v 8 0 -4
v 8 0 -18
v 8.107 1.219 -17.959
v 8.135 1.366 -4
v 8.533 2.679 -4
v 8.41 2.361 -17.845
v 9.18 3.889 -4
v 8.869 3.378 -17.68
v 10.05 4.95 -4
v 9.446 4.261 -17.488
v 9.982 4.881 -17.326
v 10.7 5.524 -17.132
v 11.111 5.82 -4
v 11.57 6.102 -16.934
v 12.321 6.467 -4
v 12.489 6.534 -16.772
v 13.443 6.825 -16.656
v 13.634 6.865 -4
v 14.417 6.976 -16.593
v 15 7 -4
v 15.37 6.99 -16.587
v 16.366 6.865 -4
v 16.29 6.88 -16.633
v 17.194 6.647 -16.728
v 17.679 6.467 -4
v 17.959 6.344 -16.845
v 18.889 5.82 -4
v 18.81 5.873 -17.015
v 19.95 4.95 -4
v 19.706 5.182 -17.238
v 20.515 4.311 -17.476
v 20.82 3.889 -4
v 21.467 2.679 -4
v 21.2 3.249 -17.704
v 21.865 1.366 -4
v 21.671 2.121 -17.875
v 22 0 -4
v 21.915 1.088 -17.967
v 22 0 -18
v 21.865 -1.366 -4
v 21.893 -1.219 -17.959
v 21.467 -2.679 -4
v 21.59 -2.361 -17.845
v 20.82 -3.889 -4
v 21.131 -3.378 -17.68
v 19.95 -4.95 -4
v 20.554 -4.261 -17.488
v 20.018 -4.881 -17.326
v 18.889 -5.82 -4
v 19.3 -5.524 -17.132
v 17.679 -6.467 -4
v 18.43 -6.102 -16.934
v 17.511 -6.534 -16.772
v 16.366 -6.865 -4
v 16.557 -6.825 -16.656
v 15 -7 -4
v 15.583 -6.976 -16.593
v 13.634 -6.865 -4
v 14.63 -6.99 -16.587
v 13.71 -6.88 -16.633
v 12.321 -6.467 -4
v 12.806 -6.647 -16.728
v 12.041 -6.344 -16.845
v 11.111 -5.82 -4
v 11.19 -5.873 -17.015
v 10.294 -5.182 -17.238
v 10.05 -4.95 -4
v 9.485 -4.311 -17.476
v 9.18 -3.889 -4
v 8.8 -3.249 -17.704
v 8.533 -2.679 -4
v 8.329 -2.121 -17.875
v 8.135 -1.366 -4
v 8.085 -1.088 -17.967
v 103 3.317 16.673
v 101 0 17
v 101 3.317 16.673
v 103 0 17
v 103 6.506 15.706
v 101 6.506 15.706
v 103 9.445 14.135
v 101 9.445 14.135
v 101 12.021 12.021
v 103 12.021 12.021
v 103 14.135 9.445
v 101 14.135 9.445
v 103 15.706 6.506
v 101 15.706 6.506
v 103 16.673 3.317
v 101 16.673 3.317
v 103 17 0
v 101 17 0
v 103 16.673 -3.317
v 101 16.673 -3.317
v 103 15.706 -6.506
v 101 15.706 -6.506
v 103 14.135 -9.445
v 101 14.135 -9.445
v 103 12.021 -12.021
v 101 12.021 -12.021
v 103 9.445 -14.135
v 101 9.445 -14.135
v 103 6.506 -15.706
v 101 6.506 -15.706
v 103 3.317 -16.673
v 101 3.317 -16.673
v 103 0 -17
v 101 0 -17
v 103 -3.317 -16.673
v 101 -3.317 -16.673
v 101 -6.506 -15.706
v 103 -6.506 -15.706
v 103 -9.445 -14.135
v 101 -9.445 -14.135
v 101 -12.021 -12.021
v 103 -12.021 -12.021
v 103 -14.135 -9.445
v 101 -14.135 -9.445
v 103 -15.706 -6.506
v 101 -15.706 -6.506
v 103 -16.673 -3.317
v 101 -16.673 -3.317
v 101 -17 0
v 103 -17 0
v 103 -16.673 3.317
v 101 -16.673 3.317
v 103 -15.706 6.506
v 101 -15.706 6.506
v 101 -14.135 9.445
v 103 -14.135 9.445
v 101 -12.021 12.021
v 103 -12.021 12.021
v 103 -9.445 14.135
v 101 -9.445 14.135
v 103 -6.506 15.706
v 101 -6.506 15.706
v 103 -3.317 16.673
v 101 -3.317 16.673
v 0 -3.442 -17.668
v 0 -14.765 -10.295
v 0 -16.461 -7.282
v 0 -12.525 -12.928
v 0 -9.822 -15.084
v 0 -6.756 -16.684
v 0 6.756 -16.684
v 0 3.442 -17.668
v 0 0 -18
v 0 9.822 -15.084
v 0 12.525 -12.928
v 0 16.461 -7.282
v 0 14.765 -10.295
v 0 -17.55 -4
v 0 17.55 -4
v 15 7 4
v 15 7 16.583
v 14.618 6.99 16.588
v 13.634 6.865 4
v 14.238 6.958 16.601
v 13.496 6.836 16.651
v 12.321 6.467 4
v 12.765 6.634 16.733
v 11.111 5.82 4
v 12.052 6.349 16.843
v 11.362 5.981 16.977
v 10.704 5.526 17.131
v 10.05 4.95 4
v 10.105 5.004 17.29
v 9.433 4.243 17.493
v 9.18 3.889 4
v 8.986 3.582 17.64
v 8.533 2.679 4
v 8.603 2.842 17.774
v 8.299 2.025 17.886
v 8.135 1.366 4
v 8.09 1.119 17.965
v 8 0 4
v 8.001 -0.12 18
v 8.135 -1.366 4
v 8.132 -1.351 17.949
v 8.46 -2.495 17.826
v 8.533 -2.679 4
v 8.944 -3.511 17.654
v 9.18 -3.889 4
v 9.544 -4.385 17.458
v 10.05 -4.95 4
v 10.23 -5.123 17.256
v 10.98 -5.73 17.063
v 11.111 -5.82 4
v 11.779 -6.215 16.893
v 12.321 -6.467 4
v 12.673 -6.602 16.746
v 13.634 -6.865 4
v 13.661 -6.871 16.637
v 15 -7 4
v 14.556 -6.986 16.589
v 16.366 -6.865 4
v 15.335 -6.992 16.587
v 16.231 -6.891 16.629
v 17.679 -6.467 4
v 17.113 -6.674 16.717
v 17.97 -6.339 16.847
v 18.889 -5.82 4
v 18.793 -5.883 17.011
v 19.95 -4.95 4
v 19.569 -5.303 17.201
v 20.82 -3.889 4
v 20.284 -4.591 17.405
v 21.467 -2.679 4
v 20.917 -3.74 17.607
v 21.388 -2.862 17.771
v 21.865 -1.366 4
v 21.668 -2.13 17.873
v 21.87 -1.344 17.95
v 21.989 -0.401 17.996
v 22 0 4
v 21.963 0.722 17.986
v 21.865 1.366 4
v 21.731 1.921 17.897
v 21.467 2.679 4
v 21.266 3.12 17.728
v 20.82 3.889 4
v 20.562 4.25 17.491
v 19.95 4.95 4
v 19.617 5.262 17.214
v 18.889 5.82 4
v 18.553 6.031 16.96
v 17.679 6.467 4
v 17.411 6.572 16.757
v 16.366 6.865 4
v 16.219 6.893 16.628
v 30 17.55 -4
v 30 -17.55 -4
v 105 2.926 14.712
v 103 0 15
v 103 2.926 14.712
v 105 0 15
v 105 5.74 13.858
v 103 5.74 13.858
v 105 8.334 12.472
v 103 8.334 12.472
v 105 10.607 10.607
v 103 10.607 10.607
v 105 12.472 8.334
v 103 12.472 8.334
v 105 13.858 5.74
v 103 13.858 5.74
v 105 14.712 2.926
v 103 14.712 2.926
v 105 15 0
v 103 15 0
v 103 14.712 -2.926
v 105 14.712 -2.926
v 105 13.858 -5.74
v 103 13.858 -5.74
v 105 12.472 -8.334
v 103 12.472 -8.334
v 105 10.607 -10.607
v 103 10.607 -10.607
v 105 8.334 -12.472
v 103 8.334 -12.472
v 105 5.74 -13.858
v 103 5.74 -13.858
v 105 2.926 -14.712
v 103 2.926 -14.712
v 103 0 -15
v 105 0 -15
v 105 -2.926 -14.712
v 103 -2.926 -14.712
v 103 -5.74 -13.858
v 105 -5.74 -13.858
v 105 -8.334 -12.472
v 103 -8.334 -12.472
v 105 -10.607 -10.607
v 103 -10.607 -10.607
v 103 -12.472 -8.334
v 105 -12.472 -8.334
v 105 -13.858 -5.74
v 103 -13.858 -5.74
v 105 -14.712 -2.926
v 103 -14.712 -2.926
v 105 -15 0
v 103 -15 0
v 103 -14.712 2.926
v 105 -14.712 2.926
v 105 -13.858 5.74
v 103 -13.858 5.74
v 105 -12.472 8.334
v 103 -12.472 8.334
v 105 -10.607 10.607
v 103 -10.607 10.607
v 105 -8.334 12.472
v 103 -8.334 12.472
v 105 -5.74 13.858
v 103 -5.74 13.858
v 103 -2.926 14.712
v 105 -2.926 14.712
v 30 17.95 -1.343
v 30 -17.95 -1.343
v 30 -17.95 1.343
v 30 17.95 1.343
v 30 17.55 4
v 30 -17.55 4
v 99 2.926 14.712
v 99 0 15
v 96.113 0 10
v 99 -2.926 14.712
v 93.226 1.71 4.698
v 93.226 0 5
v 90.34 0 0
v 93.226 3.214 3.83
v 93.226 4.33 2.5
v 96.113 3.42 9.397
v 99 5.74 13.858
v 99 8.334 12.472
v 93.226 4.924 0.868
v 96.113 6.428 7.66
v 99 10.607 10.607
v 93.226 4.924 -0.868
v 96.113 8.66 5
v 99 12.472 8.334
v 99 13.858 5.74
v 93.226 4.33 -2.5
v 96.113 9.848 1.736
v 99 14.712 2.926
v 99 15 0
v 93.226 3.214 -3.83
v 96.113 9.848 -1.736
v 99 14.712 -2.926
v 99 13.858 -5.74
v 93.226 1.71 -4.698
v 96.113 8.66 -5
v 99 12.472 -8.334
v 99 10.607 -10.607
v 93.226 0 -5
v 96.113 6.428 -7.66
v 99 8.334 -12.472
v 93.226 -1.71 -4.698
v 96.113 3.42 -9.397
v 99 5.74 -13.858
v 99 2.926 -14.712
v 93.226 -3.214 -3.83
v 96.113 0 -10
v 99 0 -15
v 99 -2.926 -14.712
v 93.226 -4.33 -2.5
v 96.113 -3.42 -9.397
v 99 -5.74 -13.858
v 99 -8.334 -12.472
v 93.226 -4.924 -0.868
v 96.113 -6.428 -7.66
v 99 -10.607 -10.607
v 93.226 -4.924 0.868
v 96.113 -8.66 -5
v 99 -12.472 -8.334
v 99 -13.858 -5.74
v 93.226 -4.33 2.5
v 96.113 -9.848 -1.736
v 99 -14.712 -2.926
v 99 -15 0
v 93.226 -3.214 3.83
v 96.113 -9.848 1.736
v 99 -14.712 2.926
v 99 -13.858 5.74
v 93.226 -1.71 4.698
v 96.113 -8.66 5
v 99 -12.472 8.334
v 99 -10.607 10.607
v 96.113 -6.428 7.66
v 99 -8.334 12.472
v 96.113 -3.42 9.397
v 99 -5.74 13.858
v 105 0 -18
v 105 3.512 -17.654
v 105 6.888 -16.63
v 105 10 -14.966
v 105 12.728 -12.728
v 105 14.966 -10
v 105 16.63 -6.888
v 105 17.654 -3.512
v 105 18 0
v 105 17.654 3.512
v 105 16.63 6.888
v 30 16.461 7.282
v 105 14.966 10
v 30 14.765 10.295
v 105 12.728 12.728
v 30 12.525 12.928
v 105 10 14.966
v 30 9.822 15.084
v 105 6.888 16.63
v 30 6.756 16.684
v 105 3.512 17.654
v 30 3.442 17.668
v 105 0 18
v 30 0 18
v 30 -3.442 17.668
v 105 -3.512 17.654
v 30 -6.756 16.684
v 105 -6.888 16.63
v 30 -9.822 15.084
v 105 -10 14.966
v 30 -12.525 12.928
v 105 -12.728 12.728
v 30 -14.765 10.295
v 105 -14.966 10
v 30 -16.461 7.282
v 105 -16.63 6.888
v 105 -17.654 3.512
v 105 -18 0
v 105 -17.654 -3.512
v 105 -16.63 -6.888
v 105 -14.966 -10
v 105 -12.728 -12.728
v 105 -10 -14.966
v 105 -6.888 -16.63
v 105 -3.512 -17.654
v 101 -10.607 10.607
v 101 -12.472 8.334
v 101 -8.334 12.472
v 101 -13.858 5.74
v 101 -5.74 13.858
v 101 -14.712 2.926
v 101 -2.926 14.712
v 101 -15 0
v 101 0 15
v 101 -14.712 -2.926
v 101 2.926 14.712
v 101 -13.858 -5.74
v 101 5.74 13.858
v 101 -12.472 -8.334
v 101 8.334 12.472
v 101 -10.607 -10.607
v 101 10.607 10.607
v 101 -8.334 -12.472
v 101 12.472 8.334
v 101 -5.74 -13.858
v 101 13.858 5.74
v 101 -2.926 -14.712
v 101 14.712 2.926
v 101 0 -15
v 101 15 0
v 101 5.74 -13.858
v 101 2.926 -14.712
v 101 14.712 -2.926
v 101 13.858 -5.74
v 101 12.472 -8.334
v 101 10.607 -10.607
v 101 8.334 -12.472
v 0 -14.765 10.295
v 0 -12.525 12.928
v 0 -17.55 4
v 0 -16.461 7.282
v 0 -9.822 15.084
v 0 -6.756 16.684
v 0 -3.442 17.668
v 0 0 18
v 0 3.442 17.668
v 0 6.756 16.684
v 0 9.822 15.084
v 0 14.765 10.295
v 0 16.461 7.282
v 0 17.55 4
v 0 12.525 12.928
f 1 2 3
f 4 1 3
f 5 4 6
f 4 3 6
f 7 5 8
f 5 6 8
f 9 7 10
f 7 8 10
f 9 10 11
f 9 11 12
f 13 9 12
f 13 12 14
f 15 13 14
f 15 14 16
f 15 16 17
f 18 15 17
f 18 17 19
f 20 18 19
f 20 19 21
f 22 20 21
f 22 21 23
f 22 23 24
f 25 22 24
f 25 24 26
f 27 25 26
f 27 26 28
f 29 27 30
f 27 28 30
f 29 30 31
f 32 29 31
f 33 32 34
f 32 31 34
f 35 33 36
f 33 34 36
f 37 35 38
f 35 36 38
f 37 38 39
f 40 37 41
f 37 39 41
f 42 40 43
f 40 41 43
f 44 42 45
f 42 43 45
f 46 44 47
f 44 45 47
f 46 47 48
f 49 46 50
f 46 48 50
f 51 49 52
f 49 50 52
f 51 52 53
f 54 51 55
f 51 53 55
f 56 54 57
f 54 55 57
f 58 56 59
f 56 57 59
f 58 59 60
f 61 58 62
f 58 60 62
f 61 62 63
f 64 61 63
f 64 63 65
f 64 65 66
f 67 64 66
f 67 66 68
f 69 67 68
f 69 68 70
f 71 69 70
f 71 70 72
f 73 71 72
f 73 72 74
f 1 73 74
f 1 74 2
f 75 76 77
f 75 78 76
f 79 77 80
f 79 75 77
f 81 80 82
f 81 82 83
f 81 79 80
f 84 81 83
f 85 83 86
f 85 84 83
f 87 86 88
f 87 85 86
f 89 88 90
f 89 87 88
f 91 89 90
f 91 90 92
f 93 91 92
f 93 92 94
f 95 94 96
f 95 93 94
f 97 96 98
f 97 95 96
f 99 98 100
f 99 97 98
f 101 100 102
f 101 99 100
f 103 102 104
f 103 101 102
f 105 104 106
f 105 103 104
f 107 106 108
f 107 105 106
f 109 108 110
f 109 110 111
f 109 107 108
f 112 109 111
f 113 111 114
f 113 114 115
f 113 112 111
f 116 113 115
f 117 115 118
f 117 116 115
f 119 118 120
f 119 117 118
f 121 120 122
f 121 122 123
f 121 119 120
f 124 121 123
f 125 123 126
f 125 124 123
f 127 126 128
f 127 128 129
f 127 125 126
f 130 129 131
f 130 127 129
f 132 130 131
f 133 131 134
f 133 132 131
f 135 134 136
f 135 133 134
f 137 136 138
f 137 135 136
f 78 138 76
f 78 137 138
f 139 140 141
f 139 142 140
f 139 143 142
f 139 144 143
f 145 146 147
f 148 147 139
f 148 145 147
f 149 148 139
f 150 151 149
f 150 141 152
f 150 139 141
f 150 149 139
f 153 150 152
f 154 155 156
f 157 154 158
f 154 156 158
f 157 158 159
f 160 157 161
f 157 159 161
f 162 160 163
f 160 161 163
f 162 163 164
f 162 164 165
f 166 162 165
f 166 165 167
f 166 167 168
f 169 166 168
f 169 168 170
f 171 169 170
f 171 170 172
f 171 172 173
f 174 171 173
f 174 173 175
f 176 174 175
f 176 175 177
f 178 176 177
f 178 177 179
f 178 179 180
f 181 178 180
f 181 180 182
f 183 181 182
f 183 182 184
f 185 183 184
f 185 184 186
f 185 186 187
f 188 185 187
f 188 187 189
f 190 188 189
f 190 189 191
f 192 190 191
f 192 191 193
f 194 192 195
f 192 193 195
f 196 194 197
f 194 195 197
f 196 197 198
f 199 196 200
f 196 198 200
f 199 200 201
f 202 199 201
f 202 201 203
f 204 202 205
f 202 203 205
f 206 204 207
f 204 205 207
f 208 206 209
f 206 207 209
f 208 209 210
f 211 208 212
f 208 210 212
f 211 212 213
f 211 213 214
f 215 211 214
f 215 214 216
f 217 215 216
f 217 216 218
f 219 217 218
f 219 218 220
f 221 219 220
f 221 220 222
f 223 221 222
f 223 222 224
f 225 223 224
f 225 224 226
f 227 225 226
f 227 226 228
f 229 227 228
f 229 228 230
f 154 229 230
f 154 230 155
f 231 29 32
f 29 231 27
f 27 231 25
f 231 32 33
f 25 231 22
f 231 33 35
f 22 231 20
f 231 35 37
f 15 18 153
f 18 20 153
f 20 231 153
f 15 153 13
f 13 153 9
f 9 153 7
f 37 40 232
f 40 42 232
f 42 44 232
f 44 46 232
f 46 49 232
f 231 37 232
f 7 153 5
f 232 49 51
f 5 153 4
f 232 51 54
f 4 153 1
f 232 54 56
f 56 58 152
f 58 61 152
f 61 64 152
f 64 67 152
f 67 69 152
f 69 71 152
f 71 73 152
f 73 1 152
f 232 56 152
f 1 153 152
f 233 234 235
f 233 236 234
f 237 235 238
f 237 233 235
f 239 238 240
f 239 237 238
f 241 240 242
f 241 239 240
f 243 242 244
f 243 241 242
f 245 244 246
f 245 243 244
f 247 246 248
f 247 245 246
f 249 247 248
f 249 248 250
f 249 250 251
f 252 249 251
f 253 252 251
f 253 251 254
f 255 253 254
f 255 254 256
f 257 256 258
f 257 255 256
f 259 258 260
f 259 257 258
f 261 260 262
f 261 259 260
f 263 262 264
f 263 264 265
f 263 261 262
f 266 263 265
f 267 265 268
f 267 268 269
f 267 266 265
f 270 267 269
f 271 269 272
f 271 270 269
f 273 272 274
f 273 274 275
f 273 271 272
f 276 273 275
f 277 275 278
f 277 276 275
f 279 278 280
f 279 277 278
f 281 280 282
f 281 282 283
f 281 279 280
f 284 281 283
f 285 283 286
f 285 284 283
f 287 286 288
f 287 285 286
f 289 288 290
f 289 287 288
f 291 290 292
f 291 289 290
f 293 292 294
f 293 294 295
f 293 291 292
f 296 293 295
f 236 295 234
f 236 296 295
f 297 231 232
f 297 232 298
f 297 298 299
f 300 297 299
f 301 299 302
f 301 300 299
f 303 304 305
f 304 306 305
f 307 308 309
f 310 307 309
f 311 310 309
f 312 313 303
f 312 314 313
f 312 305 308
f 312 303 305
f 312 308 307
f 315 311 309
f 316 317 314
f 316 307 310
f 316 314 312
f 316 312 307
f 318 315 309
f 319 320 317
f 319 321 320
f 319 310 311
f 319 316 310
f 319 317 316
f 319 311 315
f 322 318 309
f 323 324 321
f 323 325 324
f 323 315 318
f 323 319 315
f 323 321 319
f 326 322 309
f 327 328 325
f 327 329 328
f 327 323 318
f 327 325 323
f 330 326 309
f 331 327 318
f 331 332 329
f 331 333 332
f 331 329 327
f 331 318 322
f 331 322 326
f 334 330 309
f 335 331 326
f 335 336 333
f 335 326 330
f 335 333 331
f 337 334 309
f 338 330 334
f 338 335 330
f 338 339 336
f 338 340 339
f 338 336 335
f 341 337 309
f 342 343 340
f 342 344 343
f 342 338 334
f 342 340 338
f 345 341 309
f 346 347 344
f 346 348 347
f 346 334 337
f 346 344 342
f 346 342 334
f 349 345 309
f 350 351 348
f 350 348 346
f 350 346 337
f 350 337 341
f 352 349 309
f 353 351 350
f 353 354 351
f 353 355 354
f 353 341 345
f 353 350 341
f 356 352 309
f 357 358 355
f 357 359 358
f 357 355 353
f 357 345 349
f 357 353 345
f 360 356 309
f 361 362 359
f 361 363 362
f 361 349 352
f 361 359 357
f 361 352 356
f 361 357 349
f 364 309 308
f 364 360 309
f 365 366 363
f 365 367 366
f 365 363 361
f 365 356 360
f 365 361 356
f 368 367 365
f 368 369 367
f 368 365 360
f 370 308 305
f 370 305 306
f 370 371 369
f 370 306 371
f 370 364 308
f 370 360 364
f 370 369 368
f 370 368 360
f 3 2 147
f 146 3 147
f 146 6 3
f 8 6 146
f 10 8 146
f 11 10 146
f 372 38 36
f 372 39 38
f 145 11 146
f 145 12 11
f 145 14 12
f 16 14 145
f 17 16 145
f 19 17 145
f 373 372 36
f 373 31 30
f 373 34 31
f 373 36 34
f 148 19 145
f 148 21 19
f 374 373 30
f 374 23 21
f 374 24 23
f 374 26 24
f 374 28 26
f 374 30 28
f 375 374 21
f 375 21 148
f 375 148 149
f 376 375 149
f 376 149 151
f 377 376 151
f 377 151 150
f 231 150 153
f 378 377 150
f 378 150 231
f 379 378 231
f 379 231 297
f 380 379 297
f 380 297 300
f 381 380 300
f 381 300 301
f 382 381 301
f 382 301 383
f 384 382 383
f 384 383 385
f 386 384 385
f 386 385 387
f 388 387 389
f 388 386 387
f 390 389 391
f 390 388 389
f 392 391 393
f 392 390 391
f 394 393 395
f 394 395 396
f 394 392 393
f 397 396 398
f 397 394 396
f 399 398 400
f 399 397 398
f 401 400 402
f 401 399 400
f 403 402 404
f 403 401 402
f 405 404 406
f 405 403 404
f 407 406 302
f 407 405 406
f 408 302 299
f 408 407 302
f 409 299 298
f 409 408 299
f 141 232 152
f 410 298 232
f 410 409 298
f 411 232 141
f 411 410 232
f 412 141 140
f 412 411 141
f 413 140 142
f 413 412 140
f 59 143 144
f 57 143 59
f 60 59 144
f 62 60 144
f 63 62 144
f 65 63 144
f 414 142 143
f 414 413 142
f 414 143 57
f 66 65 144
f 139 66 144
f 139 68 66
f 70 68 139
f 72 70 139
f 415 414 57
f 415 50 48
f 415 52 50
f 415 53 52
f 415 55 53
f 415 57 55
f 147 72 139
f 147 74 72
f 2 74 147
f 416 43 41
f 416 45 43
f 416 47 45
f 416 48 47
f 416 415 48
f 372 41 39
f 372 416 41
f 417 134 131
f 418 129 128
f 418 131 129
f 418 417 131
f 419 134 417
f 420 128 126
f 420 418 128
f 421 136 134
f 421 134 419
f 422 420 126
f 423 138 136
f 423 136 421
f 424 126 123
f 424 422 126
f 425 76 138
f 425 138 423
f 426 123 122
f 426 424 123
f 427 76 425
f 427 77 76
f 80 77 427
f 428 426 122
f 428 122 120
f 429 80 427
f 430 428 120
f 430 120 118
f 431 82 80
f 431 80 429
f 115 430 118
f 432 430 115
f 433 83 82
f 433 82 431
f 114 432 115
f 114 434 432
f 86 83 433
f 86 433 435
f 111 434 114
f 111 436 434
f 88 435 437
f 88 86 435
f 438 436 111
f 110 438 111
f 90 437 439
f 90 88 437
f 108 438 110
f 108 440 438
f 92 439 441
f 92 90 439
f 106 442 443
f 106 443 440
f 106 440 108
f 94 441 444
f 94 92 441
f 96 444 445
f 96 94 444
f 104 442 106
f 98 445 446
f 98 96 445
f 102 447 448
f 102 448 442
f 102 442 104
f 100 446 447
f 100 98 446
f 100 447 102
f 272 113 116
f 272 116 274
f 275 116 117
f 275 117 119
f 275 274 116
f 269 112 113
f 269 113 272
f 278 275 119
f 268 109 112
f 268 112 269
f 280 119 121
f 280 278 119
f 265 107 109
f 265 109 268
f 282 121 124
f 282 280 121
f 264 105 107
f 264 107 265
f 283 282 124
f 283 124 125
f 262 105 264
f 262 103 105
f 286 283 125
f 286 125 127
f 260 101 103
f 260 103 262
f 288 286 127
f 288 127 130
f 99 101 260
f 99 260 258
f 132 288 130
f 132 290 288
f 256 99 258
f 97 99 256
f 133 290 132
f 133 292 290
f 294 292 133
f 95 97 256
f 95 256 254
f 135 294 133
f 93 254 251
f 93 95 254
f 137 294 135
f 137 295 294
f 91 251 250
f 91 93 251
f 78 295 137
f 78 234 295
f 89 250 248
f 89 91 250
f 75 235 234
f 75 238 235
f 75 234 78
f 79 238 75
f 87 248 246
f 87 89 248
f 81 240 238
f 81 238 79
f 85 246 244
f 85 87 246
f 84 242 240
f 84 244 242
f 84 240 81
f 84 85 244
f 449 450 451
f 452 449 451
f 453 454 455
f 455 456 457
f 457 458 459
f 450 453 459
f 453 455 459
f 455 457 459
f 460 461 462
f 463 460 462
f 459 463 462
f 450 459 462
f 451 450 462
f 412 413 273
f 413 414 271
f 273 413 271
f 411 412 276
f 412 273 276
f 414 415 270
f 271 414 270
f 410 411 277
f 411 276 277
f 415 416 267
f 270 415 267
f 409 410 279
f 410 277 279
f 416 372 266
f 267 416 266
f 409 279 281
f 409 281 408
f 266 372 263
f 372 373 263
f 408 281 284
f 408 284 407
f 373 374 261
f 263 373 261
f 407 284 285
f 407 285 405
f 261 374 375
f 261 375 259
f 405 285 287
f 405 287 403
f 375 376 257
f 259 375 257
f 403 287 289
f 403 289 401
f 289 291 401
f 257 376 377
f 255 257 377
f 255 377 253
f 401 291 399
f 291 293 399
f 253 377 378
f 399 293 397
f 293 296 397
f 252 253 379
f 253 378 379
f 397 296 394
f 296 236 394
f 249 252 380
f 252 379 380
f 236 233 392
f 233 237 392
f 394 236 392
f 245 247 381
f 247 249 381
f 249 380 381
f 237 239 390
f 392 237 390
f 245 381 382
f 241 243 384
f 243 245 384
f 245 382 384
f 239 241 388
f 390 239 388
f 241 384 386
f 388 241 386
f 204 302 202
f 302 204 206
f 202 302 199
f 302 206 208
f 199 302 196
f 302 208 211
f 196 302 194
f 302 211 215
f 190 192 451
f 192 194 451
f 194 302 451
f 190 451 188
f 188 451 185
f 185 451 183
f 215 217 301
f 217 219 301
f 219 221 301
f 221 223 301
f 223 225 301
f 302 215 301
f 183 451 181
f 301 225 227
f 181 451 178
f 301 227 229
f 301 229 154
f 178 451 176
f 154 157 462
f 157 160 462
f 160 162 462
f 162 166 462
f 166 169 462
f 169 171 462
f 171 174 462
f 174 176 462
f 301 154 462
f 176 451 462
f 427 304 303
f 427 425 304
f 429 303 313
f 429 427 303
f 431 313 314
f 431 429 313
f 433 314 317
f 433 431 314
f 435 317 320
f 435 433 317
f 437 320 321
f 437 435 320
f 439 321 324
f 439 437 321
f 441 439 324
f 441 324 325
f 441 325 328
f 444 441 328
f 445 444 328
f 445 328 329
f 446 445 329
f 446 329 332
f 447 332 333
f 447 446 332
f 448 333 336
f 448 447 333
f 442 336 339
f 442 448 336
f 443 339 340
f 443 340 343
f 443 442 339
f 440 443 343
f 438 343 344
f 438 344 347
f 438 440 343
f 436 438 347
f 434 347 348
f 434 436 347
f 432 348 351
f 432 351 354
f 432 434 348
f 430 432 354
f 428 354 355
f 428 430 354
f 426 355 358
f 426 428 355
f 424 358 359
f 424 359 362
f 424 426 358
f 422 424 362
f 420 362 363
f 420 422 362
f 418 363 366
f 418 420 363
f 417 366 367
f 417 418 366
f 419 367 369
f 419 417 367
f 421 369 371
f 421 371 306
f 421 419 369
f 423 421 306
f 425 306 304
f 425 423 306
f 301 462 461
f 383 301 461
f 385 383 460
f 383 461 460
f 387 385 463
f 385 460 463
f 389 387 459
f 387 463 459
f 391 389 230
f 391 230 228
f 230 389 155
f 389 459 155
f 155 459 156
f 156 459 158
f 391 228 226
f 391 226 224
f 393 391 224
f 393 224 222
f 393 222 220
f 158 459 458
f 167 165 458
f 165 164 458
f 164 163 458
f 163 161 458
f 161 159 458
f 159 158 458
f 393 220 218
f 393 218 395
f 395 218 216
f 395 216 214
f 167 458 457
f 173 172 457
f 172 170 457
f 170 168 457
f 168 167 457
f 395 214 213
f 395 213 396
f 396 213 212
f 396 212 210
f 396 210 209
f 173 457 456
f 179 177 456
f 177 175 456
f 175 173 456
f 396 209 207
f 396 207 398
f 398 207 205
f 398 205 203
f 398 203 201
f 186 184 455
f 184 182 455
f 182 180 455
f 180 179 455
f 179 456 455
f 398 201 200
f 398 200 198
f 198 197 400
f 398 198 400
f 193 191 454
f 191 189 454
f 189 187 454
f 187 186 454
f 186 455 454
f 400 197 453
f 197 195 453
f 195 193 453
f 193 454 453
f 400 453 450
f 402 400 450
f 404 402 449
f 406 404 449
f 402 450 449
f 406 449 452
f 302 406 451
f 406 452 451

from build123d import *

# Parameters (mm, degrees)
ESQUISSE1_W                      = 105
ESQUISSE1_H                      = 18
ENL_V_MAT_EXTRU_1_DEPTH          = 30
EXTRUSION1_START                 = 30
EXTRUSION1_DEPTH                 = 30
ESQUISSE5_W                      = 7
ESQUISSE5_H                      = 14
DIAM_TRE_DU_PER_AGE_M14_0_14_2_D = 14


with BuildPart() as part:
    # Esquisse1 → Révolution1 (revolve)
    with BuildSketch(Plane.XY, mode=Mode.PRIVATE) as r_volution1_sk:
        with Locations((52.5, 9)):
            Rectangle(ESQUISSE1_W, ESQUISSE1_H)
    revolve(r_volution1_sk.sketch.rotate(Axis((0, 0, 0), (1, 0, 0)), 270), axis=Axis((0, 0, 0), (1, 0, 0)))

    # Esquisse2 → Enlèv. mat.-Extru.1 (cut)
    with BuildSketch(Plane.ZY):
        with BuildLine():
            Line((-4, 17.549928775), (-4, -17.549928775))
            ThreePointArc((-4, -17.549928775), (18, 0), (-4, 17.549928775))
        make_face()
    extrude(amount=-ENL_V_MAT_EXTRU_1_DEPTH, mode=Mode.SUBTRACT)

    # Esquisse3 → Extrusion1 (add)
    with BuildSketch(Plane.ZY.offset(-30).offset(EXTRUSION1_START)):
        with BuildLine():
            Line((4, -17.549928775), (4, 17.549928775))
            ThreePointArc((4, 17.549928775), (18, 0), (4, -17.549928775))
        make_face()
    extrude(amount=-EXTRUSION1_DEPTH)

    # Esquisse4 → Enlèvement de matière-Révolution1 (revolve, cut)
    with BuildSketch(Plane(origin=(0, 0, 0), x_dir=(-1, 0, 0), z_dir=(0, 0, -1)), mode=Mode.PRIVATE) as enl_vement_de_mati_re_r_volution1_sk:
        Polygon((-105, 15), (-105, 0), (-90.339745962, 0), (-99, 15), (-101, 15), (-101, 17), (-103, 17), (-103, 15), align=None)
    revolve(enl_vement_de_mati_re_r_volution1_sk.sketch.rotate(Axis((105.000025, 0, 0), (-1, 0, 0)), 270), axis=Axis((105.000025, 0, 0), (-1, 0, 0)), mode=Mode.SUBTRACT)

    # Esquisse5 → Diamètre du perçage M14.0 (14)1 (revolve, cut)
    with BuildSketch(Plane(origin=(15, 0, 4), x_dir=(0, 1, 0), z_dir=(1, 0, 0))):
        with Locations((3.5, 7)):
            Rectangle(ESQUISSE5_W, ESQUISSE5_H)
    revolve(axis=Axis((15, 0, -2.35), (0, 0, 1)), mode=Mode.SUBTRACT)

    # Diamètre du perçage M14.0 (14)2 (through all)
    with Locations(Plane.XY.offset(-4)):
        with Locations((15, 0)):
            Hole(DIAM_TRE_DU_PER_AGE_M14_0_14_2_D / 2)


solid = part.part
